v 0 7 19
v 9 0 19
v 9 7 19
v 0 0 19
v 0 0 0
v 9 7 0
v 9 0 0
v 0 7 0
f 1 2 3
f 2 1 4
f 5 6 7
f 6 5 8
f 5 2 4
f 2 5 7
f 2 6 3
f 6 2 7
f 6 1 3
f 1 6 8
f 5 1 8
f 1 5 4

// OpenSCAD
// Generated by SolidPython 1.0.1 on 2020-07-29 00:46:55


cube(size = [9, 7, 19]);
/***********************************************
*********      SolidPython code:      **********
************************************************
 
# import packages: SolidPython
from solid import *
from solid.utils import *
from itertools import chain, combinations, permutations


class Resize:

    def __init__(self, scad_file):
        self.scad_file = scad_file
        #self.scad_file = import_scad(scad_file)
        # cone/cylinder param:
        self.r1 = 0
        self.r2 = 0
        self.h = 0
        # rectangular prism param:
        self.w = 0
        self.l = 0
        # ellipse param:
        self.r = 0

    # import OpenScad code (file name corresponds to shape)


    # classify shape + parameters
    def assign(self, param1, param2, param3):
        if self.scad_file == 'cone.scad':
            self.r1 = param1
            self.r2 = param2
            self.h = param3
        elif self.scad_file == 'cylinder.scad':
            self.r1 = param1
            self.r2 = param2
            self.h = param3
        elif self.scad_file == 'rectangularPrism.scad':
            self.h = param1
            self.l = param2
            self.w = param3
        else:
            self.r = param1
            self.h = param2

    # resize parameters
    def iterate(self):
        x = range(3, 20, 2)
        i = 1
        if self.scad_file == 'cone.scad':
            tempList = list(permutations(x, 2))
            for temp in tempList:
                param1 = temp[0]
                param2 = temp[1]
                filepath = 'produced_scad_files/' + 'cone' + str(param1) + '_' + str(param2) + '_' + '.scad'
                scad_render_to_file(cylinder(h=param1, r1=param2, r2=0), filepath)

        elif self.scad_file == 'cylinder.scad':
            tempList = list(permutations(x, 3))
            for temp in tempList:
                param1 = temp[0]
                param2 = temp[1]
                filepath = 'produced_scad_files/' + 'cylinder' + str(param1) + '_' + str(param2) + '_' + '.scad'
                scad_render_to_file(cylinder(h=param1, r1=param2, r2=param2), filepath)

        elif self.scad_file == 'rectangularPrism.scad':
            tempList = list(permutations(x, 3))
            for temp in tempList:
                param1 = temp[0]
                param2 = temp[1]
                param3 = temp[2]
                filepath = 'produced_scad_files/' + 'rectangularPrism' + str(param1) + '_' + str(param2) + '_' + str(
                    param3) + '.scad'
                scad_render_to_file(cube(size=(param1, param2, param3)), filepath)

        elif self.scad_file == 'ellipse.scad':
            tempList = list(permutations(x, 4))
            for temp in tempList:
                param1 = temp[0]
                param2 = temp[1]
                param3 = temp[2]
                param4 = temp[3]
                filepath = 'produced_scad_files/' + 'ellipse' + str(param1) + '_' + str(param2) + '_' + str(param3) + '_' + str(param4) + '.scad'
                scad_render_to_file(scale([param1, param2, param3])(sphere(r=param4)), filepath)

    def render_to_scadfile(self):
        scad_render_to_file(scad, 'example.scad') 
 
************************************************/
